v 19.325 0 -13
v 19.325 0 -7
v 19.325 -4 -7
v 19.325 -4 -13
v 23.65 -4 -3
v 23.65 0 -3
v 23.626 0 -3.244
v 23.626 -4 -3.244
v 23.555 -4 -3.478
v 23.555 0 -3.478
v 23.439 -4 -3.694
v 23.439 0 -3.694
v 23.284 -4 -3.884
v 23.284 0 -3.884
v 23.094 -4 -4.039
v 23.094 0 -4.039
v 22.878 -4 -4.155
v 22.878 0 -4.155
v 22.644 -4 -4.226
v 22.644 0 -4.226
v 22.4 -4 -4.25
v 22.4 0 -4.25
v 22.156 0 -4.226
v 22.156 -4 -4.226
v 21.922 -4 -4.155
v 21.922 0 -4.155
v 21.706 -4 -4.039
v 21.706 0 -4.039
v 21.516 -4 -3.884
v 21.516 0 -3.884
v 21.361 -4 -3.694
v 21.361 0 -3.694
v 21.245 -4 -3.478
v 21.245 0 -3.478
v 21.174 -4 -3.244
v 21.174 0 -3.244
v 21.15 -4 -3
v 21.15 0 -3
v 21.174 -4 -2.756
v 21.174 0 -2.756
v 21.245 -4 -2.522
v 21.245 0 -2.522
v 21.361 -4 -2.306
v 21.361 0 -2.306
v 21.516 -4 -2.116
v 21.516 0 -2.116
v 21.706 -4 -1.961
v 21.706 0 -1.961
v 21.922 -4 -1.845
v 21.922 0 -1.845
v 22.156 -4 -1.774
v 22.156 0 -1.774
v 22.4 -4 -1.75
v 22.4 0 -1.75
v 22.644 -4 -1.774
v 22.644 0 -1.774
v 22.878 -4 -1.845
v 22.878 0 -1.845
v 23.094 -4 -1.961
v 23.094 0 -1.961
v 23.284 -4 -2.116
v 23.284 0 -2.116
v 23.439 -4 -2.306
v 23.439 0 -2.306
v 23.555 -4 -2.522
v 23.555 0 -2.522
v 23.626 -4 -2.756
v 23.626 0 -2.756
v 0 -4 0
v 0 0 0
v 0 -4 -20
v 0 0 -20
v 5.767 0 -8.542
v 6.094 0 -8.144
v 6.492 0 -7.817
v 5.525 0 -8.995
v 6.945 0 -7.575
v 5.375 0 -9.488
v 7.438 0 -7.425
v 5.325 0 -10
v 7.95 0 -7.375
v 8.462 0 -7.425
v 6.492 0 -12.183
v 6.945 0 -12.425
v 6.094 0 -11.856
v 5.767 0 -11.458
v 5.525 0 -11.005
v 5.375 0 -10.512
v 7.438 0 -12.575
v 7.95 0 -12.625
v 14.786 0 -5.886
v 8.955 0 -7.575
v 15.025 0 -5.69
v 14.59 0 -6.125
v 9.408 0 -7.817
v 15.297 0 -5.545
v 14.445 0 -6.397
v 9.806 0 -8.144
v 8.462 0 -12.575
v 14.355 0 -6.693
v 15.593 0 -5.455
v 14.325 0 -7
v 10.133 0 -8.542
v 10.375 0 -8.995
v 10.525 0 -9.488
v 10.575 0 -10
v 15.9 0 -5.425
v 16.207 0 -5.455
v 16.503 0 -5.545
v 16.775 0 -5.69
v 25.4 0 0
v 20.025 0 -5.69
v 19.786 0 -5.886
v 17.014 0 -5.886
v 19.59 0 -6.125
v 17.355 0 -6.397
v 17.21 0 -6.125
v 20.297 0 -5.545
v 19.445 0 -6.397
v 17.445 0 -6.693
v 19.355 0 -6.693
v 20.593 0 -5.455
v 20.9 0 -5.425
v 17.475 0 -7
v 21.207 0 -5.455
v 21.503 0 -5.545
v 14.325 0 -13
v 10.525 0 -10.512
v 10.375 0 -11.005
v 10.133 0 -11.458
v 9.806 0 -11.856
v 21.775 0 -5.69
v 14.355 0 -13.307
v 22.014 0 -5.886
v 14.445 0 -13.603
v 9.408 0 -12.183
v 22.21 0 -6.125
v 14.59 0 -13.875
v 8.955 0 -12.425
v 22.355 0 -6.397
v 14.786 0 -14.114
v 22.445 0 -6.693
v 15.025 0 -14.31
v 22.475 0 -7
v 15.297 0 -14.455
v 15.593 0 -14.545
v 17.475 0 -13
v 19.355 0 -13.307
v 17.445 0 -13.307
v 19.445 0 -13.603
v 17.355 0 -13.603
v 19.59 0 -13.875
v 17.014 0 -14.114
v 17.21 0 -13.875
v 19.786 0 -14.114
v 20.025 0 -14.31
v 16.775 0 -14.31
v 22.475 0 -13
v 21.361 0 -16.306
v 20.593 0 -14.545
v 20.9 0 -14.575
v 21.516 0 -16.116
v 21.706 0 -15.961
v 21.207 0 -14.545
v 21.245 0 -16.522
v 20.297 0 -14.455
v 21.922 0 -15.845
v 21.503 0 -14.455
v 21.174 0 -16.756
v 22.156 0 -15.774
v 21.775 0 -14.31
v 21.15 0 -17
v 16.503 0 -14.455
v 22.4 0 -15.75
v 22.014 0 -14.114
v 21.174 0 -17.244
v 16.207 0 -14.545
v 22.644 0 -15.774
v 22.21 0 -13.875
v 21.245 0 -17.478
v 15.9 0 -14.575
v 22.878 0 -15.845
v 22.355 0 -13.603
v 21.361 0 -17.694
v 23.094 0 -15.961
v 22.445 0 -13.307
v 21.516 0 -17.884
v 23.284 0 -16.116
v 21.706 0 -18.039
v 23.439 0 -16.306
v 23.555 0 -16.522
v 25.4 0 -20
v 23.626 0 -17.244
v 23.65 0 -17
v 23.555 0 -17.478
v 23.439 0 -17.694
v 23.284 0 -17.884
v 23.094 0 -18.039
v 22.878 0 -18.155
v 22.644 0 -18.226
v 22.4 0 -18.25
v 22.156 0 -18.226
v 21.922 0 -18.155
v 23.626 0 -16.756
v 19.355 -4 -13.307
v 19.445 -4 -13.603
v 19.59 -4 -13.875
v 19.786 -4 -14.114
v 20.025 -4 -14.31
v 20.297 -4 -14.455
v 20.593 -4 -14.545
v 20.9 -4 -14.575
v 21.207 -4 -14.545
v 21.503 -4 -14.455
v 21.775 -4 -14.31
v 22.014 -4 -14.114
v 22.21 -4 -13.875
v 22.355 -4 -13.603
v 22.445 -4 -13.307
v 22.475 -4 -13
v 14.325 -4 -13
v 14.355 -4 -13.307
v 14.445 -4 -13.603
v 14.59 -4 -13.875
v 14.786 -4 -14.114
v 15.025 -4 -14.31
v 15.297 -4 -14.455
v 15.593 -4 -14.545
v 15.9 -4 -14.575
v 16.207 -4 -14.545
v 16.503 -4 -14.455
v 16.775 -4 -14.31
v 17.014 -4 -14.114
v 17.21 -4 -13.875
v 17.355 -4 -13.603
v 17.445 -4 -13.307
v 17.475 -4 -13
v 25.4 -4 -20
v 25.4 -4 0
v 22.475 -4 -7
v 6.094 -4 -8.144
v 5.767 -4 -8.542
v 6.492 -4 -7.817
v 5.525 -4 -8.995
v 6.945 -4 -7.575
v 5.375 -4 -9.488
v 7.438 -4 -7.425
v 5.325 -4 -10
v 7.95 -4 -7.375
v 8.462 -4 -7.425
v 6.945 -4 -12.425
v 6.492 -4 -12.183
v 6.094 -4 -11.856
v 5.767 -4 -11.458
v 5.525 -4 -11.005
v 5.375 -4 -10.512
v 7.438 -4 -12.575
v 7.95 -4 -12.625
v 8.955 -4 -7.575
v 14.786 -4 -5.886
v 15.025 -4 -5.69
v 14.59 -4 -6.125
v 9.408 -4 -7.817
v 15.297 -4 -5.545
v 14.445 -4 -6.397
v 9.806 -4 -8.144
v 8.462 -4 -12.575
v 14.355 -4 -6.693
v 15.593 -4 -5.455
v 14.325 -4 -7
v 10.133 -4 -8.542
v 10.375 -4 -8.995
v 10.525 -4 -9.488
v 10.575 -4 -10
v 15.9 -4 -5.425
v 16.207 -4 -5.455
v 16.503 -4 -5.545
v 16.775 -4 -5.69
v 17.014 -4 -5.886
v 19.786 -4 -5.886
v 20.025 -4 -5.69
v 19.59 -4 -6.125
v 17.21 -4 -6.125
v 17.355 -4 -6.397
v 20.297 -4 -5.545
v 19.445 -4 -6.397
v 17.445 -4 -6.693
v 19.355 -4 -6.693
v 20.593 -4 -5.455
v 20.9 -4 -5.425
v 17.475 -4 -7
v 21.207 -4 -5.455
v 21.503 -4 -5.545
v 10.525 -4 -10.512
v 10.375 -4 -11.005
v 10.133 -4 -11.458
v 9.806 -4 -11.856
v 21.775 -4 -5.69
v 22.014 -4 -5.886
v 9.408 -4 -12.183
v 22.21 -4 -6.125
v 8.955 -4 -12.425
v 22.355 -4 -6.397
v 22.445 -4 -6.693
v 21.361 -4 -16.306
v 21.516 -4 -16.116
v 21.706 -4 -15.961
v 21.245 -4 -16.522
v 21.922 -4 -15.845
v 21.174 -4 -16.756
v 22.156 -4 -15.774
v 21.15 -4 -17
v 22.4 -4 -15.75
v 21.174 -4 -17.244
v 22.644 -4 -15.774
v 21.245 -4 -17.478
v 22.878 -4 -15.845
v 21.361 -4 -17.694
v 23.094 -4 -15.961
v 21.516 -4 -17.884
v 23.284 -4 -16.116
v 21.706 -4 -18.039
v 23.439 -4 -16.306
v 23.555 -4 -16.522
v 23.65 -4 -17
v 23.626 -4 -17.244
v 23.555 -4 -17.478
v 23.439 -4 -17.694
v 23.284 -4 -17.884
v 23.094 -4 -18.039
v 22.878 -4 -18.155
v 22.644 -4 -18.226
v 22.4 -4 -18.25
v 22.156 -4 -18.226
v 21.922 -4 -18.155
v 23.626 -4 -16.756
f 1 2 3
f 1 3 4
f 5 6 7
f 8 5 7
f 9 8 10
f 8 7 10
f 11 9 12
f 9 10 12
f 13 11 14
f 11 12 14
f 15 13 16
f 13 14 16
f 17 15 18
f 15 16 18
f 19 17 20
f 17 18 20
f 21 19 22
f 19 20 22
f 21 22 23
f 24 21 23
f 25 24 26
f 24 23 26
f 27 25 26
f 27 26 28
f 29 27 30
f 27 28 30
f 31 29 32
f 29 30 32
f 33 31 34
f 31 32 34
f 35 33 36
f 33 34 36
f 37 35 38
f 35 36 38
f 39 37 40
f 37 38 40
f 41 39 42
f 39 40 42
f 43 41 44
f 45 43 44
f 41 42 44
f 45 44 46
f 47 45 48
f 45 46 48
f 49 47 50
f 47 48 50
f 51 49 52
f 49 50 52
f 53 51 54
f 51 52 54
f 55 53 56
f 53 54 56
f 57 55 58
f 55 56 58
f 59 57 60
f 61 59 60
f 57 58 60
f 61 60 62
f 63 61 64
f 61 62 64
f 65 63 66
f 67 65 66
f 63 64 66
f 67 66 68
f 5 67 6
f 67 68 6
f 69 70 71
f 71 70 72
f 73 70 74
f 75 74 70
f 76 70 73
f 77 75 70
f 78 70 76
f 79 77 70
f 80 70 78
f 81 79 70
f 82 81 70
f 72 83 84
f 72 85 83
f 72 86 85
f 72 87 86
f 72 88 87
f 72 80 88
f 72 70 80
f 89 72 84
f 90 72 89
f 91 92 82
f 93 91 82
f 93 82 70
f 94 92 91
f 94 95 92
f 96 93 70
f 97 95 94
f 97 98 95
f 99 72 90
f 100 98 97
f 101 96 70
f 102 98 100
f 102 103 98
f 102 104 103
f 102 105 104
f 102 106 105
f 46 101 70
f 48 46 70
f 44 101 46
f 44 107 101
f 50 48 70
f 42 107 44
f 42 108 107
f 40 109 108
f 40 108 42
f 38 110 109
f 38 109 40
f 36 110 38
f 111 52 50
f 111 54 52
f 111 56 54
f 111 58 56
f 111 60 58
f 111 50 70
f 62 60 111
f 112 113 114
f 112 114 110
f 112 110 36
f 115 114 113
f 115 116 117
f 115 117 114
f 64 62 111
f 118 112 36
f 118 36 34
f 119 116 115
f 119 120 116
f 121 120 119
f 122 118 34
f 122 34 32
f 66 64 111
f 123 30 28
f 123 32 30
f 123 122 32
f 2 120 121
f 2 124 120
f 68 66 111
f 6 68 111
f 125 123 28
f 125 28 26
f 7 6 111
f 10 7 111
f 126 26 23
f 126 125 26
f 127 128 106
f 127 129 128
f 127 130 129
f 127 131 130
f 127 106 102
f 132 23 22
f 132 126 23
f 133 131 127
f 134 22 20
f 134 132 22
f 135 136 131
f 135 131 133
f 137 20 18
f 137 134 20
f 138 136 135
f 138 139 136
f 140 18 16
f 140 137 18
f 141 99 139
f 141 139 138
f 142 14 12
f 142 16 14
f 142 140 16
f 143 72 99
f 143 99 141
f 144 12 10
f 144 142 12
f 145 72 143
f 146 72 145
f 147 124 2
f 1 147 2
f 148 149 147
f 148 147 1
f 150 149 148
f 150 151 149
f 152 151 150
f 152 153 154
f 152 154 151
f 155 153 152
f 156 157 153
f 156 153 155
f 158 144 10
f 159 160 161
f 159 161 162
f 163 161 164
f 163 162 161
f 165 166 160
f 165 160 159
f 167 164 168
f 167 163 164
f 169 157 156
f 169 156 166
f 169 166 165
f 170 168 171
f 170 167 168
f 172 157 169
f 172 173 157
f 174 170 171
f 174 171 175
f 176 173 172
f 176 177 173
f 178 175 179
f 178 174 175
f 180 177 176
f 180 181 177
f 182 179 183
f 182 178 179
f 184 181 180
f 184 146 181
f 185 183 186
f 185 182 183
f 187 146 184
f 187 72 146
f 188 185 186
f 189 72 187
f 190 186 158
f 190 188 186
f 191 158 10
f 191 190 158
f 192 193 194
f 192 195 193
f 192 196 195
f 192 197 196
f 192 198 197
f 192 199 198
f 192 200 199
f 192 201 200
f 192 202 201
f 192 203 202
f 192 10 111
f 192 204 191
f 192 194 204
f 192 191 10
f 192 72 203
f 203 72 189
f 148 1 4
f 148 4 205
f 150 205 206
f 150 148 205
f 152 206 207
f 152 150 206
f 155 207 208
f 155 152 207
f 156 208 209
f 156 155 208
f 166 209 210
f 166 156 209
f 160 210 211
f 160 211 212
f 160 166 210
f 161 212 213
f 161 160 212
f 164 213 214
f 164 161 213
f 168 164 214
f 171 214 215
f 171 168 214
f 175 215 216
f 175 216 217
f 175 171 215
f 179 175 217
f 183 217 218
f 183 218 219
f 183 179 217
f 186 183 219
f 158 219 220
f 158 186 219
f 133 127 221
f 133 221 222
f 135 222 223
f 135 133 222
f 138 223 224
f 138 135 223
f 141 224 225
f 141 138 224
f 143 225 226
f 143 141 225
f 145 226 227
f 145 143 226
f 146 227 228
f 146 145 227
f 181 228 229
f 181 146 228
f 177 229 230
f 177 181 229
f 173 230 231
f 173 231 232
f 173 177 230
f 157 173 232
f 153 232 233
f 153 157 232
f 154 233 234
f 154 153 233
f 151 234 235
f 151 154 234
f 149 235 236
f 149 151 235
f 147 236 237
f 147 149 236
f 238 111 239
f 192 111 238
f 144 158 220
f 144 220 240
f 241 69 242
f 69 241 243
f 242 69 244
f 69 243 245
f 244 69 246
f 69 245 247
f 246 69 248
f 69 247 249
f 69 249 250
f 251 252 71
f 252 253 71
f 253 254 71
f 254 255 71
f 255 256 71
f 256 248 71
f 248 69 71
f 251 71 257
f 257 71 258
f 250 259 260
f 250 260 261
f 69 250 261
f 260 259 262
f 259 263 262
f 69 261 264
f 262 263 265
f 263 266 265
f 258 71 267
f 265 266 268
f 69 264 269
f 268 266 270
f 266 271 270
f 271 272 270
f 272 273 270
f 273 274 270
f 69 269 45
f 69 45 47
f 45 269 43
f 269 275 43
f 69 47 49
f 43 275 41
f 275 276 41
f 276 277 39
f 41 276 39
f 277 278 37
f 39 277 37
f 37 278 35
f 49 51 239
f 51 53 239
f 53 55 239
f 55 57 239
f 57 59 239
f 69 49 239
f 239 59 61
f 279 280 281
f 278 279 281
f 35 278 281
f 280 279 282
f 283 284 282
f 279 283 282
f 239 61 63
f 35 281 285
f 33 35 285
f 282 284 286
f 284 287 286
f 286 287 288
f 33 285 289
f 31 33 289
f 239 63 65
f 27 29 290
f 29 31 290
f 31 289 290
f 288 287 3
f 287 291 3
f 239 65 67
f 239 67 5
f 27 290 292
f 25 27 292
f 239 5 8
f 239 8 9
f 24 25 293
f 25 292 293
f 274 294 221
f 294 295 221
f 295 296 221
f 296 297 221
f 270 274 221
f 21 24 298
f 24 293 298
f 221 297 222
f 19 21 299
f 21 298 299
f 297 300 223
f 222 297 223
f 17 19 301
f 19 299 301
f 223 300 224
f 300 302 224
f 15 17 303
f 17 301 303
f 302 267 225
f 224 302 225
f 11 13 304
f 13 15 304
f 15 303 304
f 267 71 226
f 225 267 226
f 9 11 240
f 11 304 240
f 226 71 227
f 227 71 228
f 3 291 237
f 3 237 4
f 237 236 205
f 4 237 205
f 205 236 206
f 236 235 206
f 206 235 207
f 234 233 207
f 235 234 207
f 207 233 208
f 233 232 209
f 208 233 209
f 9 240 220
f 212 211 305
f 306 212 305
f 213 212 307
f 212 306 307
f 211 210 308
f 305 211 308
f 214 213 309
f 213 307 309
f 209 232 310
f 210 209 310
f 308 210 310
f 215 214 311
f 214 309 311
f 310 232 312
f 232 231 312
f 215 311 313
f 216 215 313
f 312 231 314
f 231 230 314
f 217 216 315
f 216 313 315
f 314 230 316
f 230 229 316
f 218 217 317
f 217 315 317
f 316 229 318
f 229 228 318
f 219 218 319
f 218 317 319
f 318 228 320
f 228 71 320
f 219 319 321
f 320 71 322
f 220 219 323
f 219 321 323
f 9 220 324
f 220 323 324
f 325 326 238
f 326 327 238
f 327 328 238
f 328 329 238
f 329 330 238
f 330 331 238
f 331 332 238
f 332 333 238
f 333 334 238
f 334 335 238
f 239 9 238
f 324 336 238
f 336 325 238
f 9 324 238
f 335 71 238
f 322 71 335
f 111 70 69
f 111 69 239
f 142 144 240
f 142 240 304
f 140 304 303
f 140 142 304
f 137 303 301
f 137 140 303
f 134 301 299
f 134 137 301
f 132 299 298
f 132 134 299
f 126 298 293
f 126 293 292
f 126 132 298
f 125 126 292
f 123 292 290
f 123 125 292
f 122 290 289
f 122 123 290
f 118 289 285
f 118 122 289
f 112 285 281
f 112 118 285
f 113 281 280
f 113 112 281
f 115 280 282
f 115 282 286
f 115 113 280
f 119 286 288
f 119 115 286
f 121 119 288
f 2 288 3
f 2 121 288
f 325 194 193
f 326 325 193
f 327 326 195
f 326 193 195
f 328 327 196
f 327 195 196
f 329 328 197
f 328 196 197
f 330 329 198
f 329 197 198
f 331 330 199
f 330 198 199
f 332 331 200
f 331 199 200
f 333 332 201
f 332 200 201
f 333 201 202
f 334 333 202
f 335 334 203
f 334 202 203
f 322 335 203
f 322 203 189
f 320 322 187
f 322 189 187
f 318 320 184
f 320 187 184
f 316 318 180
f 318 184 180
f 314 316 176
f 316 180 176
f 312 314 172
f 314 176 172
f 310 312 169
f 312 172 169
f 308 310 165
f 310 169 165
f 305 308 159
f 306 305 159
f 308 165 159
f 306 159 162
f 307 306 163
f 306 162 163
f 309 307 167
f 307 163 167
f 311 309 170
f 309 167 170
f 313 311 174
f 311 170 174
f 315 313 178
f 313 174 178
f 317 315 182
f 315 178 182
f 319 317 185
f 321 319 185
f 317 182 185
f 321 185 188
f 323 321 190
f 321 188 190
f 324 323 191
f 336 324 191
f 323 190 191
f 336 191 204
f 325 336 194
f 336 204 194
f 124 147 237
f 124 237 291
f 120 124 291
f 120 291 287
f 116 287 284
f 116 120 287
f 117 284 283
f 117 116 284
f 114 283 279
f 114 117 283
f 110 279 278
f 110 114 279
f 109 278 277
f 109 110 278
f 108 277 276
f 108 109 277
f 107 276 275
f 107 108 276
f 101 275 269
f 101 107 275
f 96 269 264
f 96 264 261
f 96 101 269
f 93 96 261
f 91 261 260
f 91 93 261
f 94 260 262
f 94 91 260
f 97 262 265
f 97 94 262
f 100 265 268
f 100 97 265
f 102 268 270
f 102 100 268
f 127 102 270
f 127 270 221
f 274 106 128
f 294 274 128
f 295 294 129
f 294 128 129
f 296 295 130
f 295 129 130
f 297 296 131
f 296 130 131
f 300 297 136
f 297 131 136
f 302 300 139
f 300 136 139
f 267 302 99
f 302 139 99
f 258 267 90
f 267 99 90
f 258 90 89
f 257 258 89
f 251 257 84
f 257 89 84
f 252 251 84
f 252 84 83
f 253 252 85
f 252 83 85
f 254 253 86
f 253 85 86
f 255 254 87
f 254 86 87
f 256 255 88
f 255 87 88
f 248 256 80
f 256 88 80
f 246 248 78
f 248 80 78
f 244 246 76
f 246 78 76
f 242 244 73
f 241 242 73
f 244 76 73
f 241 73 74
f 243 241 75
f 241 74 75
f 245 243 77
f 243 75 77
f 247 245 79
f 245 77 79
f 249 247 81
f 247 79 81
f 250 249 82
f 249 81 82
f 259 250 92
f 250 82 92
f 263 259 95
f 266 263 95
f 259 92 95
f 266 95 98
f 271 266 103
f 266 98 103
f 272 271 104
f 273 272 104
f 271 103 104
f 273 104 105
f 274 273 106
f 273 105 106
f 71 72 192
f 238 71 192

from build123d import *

# Parameters (mm, degrees)
SKETCH1_W           = 25.4
SKETCH1_H           = 20
SKETCH1_R           = 1.25
SKETCH1_R_2         = 2.625
BOSS_EXTRUDE1_DEPTH = 4


with BuildPart() as part:
    # Sketch1 → Boss-Extrude1 (new body)
    with BuildSketch(Plane(origin=(0, 0, 0), x_dir=(1, 0, 0), z_dir=(0, 1, 0))):
        with Locations((12.7, 10)):
            Rectangle(SKETCH1_W, SKETCH1_H)
        with Locations((22.4, 17)):
            Circle(SKETCH1_R, mode=Mode.SUBTRACT)
        with Locations((7.95, 10)):
            Circle(SKETCH1_R_2, mode=Mode.SUBTRACT)
        with Locations((22.4, 3)):
            Circle(SKETCH1_R, mode=Mode.SUBTRACT)
        with BuildLine():
            Line((19.325, 7), (19.325, 13))
            ThreePointArc((19.325, 13), (20.9, 14.575), (22.475, 13))
            Line((22.475, 13), (22.475, 7))
            ThreePointArc((22.475, 7), (20.9, 5.425), (19.325, 7))
        make_face(mode=Mode.SUBTRACT)
        with BuildLine():
            Line((14.325, 7), (14.325, 13))
            ThreePointArc((14.325, 13), (15.9, 14.575), (17.475, 13))
            Line((17.475, 13), (17.475, 7))
            ThreePointArc((17.475, 7), (15.9, 5.425), (14.325, 7))
        make_face(mode=Mode.SUBTRACT)
    extrude(amount=-BOSS_EXTRUDE1_DEPTH)


solid = part.part
